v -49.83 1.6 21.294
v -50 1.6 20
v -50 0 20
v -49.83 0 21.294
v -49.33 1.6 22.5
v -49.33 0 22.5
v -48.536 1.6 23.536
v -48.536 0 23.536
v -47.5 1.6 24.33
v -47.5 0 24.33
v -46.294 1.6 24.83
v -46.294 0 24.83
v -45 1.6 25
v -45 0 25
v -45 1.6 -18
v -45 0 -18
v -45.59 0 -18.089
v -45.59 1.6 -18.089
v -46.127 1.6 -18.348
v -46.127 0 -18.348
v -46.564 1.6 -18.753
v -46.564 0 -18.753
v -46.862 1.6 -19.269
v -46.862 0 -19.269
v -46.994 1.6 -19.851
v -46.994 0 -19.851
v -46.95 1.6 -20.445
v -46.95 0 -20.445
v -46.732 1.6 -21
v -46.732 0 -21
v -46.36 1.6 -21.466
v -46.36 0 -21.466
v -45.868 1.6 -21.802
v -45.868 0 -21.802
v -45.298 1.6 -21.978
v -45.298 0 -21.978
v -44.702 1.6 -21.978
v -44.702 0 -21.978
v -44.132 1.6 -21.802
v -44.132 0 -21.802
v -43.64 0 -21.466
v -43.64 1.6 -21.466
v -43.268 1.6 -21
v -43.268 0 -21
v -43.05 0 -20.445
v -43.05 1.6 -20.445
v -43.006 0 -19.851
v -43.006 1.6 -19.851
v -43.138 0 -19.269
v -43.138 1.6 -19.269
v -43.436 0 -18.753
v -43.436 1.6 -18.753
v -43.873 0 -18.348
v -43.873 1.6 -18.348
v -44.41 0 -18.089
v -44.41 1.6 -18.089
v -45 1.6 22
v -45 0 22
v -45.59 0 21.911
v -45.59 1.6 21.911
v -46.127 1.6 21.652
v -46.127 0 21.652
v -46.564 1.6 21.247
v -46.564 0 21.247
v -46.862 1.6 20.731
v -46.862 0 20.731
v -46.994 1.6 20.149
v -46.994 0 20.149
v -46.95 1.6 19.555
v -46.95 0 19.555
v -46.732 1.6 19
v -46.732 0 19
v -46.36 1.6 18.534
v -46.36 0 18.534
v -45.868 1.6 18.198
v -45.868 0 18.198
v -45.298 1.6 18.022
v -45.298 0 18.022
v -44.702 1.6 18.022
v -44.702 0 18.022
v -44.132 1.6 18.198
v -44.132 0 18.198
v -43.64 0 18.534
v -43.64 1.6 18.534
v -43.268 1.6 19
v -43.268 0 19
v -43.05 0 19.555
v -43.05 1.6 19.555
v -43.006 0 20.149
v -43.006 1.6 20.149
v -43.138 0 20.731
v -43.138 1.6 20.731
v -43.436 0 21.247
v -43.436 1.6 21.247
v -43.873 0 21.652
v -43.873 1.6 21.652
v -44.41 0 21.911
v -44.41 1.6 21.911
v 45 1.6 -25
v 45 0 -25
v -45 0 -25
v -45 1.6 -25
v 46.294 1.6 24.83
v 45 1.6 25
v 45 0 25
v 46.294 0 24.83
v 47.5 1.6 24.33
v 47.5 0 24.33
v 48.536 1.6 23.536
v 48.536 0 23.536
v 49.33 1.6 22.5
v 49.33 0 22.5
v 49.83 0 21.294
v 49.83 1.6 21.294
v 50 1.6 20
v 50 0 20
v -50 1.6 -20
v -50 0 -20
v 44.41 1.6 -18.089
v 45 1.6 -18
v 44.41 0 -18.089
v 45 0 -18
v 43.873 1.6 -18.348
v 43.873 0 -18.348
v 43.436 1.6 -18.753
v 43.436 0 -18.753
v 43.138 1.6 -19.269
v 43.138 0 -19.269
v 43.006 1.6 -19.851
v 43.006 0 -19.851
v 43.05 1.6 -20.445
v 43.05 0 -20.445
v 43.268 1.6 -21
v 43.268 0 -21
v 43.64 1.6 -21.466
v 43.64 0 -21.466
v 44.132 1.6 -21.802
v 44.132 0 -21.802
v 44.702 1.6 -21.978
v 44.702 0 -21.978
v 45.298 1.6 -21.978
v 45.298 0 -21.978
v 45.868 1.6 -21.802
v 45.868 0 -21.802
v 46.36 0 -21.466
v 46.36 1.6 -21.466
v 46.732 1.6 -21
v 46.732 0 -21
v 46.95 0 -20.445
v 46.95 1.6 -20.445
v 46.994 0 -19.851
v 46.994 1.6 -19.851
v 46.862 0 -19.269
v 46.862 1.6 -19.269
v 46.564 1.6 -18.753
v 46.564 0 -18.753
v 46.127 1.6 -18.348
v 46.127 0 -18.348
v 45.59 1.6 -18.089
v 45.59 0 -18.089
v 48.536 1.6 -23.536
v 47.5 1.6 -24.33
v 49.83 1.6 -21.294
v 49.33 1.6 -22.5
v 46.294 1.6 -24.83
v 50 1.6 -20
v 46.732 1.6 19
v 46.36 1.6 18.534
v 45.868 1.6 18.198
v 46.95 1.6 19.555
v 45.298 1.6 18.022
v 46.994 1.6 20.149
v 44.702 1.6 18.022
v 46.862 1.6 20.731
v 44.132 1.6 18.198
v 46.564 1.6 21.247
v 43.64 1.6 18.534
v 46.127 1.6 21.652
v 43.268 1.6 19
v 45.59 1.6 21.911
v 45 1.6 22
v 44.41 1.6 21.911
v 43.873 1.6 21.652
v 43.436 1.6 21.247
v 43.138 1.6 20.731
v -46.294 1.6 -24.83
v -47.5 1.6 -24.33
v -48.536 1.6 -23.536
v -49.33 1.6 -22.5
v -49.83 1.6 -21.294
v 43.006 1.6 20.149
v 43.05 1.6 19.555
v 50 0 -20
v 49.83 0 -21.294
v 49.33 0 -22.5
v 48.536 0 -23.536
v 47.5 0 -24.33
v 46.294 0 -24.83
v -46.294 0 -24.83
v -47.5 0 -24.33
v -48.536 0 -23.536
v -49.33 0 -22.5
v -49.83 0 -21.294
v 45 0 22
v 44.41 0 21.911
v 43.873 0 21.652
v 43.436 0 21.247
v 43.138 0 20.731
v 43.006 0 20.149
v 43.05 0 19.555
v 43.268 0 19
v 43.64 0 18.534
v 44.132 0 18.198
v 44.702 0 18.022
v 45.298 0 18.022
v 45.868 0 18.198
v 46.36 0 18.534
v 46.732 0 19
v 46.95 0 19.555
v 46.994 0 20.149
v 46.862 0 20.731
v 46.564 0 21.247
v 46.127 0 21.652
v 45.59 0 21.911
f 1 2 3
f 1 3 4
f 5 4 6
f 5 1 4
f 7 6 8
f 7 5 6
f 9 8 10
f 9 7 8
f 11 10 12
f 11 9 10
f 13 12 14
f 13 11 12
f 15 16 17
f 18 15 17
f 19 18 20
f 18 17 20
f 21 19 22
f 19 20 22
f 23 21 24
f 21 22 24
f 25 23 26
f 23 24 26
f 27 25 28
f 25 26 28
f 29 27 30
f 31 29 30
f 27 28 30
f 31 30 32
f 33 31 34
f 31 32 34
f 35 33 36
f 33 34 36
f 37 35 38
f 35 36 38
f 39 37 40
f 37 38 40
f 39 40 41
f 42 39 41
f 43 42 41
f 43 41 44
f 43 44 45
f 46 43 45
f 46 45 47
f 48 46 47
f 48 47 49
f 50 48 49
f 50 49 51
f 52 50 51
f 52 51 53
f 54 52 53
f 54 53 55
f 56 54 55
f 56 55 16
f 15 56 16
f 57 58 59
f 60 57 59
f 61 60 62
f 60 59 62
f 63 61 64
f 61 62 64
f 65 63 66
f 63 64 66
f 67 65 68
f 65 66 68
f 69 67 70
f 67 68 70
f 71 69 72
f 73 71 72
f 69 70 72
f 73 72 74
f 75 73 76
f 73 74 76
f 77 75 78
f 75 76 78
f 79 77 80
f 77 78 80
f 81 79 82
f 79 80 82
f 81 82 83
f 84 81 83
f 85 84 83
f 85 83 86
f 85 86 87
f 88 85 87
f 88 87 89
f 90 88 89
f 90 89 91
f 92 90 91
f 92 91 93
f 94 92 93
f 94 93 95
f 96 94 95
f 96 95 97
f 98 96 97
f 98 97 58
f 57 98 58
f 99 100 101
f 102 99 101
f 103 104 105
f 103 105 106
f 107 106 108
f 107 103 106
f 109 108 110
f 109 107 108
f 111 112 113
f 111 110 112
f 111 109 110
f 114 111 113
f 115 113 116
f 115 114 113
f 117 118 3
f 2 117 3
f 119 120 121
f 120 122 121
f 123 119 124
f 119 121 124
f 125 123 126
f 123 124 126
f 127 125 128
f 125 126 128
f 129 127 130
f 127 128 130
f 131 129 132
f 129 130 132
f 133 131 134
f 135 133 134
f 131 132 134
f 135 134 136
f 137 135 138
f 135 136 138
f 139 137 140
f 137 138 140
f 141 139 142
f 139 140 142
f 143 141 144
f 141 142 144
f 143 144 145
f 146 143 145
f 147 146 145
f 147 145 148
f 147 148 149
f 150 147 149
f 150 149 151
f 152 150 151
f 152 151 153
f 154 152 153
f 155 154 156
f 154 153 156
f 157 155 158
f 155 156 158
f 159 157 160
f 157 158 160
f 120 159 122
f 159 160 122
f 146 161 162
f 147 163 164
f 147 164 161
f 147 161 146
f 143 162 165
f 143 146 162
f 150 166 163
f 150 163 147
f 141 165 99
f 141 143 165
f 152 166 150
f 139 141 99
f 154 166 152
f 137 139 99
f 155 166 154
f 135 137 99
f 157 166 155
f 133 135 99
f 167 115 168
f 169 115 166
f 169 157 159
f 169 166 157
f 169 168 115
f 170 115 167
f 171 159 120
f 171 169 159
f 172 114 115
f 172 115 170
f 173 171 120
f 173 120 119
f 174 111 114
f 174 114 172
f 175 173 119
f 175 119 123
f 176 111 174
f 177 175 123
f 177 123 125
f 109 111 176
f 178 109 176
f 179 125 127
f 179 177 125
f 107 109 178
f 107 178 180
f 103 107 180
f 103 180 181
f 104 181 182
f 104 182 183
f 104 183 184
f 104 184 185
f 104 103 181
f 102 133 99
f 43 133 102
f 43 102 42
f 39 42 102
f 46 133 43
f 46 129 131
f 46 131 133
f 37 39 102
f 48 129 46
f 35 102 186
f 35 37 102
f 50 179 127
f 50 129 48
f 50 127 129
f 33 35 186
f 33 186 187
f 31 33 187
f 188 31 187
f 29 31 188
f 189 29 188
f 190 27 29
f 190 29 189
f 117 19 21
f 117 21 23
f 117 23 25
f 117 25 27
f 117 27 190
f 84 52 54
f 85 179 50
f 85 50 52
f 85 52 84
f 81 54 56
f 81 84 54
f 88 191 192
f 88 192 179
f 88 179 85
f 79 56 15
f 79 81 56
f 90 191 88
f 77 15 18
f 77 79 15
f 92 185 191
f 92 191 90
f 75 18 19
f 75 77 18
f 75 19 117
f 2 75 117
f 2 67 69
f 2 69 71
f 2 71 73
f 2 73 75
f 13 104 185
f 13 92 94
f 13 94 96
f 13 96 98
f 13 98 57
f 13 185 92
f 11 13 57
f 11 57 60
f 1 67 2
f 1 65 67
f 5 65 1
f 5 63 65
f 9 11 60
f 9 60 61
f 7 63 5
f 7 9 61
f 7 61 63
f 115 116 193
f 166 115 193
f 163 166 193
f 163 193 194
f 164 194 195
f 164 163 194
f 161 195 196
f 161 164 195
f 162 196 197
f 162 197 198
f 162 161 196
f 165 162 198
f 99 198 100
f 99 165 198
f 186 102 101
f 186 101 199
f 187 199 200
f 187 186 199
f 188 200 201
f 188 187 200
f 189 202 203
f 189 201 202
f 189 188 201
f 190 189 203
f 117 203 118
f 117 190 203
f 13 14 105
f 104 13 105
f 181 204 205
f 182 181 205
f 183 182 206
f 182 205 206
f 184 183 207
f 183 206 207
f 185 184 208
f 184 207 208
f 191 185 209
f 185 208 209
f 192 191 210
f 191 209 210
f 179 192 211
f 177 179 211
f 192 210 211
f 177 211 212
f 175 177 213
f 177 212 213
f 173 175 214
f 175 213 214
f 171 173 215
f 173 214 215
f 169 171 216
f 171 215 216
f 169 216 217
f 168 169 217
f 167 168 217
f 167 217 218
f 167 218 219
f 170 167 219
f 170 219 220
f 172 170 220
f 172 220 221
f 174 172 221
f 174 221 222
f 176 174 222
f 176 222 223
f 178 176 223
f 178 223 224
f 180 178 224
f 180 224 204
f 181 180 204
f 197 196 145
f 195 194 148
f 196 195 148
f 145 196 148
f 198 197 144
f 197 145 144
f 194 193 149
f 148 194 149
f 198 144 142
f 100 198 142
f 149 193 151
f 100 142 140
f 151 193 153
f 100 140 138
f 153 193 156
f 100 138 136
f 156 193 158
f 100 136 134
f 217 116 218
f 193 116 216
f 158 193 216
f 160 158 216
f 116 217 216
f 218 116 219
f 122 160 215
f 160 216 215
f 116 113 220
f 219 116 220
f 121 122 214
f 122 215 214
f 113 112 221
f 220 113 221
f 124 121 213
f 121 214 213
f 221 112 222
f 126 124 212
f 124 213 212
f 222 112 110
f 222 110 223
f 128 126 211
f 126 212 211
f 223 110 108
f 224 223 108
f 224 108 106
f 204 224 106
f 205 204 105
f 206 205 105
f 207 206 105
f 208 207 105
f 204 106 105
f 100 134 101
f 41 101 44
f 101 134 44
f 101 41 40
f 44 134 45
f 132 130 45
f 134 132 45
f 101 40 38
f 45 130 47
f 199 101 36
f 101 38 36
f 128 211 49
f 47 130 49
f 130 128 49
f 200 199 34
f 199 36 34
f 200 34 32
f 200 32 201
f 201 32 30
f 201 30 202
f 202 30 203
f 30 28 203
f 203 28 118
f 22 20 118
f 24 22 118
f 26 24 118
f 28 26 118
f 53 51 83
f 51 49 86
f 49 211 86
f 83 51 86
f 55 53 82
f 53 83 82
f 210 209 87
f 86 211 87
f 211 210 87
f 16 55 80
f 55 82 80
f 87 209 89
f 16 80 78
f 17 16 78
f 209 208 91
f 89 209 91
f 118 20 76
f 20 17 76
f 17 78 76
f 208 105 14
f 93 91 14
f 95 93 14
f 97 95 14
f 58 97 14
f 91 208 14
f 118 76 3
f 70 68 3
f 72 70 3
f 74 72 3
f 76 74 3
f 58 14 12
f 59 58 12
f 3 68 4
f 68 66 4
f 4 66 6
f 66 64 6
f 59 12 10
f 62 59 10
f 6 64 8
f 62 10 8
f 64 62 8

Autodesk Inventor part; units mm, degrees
ref_plane "YZ Plane" through (0, 0, 0) normal (1, 0, 0) x (0, 1, 0)
ref_plane "XZ Plane" through (0, 0, 0) normal (0, 1, 0) x (-1, 0, 0)
ref_plane "XY Plane" through (0, 0, 0) normal (0, 0, 1) x (1, 0, 0)
sketch "Sketch1" plane through (0, 0, 0) normal (0, 1, 0) x (-1, 0, 0)
  line L0 (-50, -25) -> (50, -25)
  line L1 (50, -25) -> (50, 25)
  line L2 (50, 25) -> (-50, 25)
  line L3 (-50, 25) -> (-50, -25)
  line L4 (-50, -25) -> (50, 25) construction
  line L5 (50, -25) -> (-50, 25) construction
  point P0 (0, 0)
  dimension "d0" = 100
  dimension "d1" = 50
extrude "Extrusion1" add sketch "Sketch1" along normal blind 1.6
fillet "Fillet1" radius 5 4 edges at (50, 0.8, 25) (-50, 0.8, 25) (-50, 0.8, -25) (50, 0.8, -25)
sketch "Sketch2" plane through (0, 1.6, 0) normal (0, 1, 0) x (1, 0, 0)
  arc A0 (50, 20) -> (45, 25) centre (45, 20) ccw projected
  arc A1 (-45, 25) -> (-50, 20) centre (-45, 20) ccw projected
  arc A2 (-50, -20) -> (-45, -25) centre (-45, -20) ccw projected
  arc A3 (45, -25) -> (50, -20) centre (45, -20) ccw projected
  point P0 (0, 0)
hole "Hole1" at (-45, 1.6, -20) at (-45, 1.6, 20) at (45, 1.6, 20) at (45, 1.6, -20) direction (0, -1, 0) diameter 4 end through all
properties part number "PCB"
